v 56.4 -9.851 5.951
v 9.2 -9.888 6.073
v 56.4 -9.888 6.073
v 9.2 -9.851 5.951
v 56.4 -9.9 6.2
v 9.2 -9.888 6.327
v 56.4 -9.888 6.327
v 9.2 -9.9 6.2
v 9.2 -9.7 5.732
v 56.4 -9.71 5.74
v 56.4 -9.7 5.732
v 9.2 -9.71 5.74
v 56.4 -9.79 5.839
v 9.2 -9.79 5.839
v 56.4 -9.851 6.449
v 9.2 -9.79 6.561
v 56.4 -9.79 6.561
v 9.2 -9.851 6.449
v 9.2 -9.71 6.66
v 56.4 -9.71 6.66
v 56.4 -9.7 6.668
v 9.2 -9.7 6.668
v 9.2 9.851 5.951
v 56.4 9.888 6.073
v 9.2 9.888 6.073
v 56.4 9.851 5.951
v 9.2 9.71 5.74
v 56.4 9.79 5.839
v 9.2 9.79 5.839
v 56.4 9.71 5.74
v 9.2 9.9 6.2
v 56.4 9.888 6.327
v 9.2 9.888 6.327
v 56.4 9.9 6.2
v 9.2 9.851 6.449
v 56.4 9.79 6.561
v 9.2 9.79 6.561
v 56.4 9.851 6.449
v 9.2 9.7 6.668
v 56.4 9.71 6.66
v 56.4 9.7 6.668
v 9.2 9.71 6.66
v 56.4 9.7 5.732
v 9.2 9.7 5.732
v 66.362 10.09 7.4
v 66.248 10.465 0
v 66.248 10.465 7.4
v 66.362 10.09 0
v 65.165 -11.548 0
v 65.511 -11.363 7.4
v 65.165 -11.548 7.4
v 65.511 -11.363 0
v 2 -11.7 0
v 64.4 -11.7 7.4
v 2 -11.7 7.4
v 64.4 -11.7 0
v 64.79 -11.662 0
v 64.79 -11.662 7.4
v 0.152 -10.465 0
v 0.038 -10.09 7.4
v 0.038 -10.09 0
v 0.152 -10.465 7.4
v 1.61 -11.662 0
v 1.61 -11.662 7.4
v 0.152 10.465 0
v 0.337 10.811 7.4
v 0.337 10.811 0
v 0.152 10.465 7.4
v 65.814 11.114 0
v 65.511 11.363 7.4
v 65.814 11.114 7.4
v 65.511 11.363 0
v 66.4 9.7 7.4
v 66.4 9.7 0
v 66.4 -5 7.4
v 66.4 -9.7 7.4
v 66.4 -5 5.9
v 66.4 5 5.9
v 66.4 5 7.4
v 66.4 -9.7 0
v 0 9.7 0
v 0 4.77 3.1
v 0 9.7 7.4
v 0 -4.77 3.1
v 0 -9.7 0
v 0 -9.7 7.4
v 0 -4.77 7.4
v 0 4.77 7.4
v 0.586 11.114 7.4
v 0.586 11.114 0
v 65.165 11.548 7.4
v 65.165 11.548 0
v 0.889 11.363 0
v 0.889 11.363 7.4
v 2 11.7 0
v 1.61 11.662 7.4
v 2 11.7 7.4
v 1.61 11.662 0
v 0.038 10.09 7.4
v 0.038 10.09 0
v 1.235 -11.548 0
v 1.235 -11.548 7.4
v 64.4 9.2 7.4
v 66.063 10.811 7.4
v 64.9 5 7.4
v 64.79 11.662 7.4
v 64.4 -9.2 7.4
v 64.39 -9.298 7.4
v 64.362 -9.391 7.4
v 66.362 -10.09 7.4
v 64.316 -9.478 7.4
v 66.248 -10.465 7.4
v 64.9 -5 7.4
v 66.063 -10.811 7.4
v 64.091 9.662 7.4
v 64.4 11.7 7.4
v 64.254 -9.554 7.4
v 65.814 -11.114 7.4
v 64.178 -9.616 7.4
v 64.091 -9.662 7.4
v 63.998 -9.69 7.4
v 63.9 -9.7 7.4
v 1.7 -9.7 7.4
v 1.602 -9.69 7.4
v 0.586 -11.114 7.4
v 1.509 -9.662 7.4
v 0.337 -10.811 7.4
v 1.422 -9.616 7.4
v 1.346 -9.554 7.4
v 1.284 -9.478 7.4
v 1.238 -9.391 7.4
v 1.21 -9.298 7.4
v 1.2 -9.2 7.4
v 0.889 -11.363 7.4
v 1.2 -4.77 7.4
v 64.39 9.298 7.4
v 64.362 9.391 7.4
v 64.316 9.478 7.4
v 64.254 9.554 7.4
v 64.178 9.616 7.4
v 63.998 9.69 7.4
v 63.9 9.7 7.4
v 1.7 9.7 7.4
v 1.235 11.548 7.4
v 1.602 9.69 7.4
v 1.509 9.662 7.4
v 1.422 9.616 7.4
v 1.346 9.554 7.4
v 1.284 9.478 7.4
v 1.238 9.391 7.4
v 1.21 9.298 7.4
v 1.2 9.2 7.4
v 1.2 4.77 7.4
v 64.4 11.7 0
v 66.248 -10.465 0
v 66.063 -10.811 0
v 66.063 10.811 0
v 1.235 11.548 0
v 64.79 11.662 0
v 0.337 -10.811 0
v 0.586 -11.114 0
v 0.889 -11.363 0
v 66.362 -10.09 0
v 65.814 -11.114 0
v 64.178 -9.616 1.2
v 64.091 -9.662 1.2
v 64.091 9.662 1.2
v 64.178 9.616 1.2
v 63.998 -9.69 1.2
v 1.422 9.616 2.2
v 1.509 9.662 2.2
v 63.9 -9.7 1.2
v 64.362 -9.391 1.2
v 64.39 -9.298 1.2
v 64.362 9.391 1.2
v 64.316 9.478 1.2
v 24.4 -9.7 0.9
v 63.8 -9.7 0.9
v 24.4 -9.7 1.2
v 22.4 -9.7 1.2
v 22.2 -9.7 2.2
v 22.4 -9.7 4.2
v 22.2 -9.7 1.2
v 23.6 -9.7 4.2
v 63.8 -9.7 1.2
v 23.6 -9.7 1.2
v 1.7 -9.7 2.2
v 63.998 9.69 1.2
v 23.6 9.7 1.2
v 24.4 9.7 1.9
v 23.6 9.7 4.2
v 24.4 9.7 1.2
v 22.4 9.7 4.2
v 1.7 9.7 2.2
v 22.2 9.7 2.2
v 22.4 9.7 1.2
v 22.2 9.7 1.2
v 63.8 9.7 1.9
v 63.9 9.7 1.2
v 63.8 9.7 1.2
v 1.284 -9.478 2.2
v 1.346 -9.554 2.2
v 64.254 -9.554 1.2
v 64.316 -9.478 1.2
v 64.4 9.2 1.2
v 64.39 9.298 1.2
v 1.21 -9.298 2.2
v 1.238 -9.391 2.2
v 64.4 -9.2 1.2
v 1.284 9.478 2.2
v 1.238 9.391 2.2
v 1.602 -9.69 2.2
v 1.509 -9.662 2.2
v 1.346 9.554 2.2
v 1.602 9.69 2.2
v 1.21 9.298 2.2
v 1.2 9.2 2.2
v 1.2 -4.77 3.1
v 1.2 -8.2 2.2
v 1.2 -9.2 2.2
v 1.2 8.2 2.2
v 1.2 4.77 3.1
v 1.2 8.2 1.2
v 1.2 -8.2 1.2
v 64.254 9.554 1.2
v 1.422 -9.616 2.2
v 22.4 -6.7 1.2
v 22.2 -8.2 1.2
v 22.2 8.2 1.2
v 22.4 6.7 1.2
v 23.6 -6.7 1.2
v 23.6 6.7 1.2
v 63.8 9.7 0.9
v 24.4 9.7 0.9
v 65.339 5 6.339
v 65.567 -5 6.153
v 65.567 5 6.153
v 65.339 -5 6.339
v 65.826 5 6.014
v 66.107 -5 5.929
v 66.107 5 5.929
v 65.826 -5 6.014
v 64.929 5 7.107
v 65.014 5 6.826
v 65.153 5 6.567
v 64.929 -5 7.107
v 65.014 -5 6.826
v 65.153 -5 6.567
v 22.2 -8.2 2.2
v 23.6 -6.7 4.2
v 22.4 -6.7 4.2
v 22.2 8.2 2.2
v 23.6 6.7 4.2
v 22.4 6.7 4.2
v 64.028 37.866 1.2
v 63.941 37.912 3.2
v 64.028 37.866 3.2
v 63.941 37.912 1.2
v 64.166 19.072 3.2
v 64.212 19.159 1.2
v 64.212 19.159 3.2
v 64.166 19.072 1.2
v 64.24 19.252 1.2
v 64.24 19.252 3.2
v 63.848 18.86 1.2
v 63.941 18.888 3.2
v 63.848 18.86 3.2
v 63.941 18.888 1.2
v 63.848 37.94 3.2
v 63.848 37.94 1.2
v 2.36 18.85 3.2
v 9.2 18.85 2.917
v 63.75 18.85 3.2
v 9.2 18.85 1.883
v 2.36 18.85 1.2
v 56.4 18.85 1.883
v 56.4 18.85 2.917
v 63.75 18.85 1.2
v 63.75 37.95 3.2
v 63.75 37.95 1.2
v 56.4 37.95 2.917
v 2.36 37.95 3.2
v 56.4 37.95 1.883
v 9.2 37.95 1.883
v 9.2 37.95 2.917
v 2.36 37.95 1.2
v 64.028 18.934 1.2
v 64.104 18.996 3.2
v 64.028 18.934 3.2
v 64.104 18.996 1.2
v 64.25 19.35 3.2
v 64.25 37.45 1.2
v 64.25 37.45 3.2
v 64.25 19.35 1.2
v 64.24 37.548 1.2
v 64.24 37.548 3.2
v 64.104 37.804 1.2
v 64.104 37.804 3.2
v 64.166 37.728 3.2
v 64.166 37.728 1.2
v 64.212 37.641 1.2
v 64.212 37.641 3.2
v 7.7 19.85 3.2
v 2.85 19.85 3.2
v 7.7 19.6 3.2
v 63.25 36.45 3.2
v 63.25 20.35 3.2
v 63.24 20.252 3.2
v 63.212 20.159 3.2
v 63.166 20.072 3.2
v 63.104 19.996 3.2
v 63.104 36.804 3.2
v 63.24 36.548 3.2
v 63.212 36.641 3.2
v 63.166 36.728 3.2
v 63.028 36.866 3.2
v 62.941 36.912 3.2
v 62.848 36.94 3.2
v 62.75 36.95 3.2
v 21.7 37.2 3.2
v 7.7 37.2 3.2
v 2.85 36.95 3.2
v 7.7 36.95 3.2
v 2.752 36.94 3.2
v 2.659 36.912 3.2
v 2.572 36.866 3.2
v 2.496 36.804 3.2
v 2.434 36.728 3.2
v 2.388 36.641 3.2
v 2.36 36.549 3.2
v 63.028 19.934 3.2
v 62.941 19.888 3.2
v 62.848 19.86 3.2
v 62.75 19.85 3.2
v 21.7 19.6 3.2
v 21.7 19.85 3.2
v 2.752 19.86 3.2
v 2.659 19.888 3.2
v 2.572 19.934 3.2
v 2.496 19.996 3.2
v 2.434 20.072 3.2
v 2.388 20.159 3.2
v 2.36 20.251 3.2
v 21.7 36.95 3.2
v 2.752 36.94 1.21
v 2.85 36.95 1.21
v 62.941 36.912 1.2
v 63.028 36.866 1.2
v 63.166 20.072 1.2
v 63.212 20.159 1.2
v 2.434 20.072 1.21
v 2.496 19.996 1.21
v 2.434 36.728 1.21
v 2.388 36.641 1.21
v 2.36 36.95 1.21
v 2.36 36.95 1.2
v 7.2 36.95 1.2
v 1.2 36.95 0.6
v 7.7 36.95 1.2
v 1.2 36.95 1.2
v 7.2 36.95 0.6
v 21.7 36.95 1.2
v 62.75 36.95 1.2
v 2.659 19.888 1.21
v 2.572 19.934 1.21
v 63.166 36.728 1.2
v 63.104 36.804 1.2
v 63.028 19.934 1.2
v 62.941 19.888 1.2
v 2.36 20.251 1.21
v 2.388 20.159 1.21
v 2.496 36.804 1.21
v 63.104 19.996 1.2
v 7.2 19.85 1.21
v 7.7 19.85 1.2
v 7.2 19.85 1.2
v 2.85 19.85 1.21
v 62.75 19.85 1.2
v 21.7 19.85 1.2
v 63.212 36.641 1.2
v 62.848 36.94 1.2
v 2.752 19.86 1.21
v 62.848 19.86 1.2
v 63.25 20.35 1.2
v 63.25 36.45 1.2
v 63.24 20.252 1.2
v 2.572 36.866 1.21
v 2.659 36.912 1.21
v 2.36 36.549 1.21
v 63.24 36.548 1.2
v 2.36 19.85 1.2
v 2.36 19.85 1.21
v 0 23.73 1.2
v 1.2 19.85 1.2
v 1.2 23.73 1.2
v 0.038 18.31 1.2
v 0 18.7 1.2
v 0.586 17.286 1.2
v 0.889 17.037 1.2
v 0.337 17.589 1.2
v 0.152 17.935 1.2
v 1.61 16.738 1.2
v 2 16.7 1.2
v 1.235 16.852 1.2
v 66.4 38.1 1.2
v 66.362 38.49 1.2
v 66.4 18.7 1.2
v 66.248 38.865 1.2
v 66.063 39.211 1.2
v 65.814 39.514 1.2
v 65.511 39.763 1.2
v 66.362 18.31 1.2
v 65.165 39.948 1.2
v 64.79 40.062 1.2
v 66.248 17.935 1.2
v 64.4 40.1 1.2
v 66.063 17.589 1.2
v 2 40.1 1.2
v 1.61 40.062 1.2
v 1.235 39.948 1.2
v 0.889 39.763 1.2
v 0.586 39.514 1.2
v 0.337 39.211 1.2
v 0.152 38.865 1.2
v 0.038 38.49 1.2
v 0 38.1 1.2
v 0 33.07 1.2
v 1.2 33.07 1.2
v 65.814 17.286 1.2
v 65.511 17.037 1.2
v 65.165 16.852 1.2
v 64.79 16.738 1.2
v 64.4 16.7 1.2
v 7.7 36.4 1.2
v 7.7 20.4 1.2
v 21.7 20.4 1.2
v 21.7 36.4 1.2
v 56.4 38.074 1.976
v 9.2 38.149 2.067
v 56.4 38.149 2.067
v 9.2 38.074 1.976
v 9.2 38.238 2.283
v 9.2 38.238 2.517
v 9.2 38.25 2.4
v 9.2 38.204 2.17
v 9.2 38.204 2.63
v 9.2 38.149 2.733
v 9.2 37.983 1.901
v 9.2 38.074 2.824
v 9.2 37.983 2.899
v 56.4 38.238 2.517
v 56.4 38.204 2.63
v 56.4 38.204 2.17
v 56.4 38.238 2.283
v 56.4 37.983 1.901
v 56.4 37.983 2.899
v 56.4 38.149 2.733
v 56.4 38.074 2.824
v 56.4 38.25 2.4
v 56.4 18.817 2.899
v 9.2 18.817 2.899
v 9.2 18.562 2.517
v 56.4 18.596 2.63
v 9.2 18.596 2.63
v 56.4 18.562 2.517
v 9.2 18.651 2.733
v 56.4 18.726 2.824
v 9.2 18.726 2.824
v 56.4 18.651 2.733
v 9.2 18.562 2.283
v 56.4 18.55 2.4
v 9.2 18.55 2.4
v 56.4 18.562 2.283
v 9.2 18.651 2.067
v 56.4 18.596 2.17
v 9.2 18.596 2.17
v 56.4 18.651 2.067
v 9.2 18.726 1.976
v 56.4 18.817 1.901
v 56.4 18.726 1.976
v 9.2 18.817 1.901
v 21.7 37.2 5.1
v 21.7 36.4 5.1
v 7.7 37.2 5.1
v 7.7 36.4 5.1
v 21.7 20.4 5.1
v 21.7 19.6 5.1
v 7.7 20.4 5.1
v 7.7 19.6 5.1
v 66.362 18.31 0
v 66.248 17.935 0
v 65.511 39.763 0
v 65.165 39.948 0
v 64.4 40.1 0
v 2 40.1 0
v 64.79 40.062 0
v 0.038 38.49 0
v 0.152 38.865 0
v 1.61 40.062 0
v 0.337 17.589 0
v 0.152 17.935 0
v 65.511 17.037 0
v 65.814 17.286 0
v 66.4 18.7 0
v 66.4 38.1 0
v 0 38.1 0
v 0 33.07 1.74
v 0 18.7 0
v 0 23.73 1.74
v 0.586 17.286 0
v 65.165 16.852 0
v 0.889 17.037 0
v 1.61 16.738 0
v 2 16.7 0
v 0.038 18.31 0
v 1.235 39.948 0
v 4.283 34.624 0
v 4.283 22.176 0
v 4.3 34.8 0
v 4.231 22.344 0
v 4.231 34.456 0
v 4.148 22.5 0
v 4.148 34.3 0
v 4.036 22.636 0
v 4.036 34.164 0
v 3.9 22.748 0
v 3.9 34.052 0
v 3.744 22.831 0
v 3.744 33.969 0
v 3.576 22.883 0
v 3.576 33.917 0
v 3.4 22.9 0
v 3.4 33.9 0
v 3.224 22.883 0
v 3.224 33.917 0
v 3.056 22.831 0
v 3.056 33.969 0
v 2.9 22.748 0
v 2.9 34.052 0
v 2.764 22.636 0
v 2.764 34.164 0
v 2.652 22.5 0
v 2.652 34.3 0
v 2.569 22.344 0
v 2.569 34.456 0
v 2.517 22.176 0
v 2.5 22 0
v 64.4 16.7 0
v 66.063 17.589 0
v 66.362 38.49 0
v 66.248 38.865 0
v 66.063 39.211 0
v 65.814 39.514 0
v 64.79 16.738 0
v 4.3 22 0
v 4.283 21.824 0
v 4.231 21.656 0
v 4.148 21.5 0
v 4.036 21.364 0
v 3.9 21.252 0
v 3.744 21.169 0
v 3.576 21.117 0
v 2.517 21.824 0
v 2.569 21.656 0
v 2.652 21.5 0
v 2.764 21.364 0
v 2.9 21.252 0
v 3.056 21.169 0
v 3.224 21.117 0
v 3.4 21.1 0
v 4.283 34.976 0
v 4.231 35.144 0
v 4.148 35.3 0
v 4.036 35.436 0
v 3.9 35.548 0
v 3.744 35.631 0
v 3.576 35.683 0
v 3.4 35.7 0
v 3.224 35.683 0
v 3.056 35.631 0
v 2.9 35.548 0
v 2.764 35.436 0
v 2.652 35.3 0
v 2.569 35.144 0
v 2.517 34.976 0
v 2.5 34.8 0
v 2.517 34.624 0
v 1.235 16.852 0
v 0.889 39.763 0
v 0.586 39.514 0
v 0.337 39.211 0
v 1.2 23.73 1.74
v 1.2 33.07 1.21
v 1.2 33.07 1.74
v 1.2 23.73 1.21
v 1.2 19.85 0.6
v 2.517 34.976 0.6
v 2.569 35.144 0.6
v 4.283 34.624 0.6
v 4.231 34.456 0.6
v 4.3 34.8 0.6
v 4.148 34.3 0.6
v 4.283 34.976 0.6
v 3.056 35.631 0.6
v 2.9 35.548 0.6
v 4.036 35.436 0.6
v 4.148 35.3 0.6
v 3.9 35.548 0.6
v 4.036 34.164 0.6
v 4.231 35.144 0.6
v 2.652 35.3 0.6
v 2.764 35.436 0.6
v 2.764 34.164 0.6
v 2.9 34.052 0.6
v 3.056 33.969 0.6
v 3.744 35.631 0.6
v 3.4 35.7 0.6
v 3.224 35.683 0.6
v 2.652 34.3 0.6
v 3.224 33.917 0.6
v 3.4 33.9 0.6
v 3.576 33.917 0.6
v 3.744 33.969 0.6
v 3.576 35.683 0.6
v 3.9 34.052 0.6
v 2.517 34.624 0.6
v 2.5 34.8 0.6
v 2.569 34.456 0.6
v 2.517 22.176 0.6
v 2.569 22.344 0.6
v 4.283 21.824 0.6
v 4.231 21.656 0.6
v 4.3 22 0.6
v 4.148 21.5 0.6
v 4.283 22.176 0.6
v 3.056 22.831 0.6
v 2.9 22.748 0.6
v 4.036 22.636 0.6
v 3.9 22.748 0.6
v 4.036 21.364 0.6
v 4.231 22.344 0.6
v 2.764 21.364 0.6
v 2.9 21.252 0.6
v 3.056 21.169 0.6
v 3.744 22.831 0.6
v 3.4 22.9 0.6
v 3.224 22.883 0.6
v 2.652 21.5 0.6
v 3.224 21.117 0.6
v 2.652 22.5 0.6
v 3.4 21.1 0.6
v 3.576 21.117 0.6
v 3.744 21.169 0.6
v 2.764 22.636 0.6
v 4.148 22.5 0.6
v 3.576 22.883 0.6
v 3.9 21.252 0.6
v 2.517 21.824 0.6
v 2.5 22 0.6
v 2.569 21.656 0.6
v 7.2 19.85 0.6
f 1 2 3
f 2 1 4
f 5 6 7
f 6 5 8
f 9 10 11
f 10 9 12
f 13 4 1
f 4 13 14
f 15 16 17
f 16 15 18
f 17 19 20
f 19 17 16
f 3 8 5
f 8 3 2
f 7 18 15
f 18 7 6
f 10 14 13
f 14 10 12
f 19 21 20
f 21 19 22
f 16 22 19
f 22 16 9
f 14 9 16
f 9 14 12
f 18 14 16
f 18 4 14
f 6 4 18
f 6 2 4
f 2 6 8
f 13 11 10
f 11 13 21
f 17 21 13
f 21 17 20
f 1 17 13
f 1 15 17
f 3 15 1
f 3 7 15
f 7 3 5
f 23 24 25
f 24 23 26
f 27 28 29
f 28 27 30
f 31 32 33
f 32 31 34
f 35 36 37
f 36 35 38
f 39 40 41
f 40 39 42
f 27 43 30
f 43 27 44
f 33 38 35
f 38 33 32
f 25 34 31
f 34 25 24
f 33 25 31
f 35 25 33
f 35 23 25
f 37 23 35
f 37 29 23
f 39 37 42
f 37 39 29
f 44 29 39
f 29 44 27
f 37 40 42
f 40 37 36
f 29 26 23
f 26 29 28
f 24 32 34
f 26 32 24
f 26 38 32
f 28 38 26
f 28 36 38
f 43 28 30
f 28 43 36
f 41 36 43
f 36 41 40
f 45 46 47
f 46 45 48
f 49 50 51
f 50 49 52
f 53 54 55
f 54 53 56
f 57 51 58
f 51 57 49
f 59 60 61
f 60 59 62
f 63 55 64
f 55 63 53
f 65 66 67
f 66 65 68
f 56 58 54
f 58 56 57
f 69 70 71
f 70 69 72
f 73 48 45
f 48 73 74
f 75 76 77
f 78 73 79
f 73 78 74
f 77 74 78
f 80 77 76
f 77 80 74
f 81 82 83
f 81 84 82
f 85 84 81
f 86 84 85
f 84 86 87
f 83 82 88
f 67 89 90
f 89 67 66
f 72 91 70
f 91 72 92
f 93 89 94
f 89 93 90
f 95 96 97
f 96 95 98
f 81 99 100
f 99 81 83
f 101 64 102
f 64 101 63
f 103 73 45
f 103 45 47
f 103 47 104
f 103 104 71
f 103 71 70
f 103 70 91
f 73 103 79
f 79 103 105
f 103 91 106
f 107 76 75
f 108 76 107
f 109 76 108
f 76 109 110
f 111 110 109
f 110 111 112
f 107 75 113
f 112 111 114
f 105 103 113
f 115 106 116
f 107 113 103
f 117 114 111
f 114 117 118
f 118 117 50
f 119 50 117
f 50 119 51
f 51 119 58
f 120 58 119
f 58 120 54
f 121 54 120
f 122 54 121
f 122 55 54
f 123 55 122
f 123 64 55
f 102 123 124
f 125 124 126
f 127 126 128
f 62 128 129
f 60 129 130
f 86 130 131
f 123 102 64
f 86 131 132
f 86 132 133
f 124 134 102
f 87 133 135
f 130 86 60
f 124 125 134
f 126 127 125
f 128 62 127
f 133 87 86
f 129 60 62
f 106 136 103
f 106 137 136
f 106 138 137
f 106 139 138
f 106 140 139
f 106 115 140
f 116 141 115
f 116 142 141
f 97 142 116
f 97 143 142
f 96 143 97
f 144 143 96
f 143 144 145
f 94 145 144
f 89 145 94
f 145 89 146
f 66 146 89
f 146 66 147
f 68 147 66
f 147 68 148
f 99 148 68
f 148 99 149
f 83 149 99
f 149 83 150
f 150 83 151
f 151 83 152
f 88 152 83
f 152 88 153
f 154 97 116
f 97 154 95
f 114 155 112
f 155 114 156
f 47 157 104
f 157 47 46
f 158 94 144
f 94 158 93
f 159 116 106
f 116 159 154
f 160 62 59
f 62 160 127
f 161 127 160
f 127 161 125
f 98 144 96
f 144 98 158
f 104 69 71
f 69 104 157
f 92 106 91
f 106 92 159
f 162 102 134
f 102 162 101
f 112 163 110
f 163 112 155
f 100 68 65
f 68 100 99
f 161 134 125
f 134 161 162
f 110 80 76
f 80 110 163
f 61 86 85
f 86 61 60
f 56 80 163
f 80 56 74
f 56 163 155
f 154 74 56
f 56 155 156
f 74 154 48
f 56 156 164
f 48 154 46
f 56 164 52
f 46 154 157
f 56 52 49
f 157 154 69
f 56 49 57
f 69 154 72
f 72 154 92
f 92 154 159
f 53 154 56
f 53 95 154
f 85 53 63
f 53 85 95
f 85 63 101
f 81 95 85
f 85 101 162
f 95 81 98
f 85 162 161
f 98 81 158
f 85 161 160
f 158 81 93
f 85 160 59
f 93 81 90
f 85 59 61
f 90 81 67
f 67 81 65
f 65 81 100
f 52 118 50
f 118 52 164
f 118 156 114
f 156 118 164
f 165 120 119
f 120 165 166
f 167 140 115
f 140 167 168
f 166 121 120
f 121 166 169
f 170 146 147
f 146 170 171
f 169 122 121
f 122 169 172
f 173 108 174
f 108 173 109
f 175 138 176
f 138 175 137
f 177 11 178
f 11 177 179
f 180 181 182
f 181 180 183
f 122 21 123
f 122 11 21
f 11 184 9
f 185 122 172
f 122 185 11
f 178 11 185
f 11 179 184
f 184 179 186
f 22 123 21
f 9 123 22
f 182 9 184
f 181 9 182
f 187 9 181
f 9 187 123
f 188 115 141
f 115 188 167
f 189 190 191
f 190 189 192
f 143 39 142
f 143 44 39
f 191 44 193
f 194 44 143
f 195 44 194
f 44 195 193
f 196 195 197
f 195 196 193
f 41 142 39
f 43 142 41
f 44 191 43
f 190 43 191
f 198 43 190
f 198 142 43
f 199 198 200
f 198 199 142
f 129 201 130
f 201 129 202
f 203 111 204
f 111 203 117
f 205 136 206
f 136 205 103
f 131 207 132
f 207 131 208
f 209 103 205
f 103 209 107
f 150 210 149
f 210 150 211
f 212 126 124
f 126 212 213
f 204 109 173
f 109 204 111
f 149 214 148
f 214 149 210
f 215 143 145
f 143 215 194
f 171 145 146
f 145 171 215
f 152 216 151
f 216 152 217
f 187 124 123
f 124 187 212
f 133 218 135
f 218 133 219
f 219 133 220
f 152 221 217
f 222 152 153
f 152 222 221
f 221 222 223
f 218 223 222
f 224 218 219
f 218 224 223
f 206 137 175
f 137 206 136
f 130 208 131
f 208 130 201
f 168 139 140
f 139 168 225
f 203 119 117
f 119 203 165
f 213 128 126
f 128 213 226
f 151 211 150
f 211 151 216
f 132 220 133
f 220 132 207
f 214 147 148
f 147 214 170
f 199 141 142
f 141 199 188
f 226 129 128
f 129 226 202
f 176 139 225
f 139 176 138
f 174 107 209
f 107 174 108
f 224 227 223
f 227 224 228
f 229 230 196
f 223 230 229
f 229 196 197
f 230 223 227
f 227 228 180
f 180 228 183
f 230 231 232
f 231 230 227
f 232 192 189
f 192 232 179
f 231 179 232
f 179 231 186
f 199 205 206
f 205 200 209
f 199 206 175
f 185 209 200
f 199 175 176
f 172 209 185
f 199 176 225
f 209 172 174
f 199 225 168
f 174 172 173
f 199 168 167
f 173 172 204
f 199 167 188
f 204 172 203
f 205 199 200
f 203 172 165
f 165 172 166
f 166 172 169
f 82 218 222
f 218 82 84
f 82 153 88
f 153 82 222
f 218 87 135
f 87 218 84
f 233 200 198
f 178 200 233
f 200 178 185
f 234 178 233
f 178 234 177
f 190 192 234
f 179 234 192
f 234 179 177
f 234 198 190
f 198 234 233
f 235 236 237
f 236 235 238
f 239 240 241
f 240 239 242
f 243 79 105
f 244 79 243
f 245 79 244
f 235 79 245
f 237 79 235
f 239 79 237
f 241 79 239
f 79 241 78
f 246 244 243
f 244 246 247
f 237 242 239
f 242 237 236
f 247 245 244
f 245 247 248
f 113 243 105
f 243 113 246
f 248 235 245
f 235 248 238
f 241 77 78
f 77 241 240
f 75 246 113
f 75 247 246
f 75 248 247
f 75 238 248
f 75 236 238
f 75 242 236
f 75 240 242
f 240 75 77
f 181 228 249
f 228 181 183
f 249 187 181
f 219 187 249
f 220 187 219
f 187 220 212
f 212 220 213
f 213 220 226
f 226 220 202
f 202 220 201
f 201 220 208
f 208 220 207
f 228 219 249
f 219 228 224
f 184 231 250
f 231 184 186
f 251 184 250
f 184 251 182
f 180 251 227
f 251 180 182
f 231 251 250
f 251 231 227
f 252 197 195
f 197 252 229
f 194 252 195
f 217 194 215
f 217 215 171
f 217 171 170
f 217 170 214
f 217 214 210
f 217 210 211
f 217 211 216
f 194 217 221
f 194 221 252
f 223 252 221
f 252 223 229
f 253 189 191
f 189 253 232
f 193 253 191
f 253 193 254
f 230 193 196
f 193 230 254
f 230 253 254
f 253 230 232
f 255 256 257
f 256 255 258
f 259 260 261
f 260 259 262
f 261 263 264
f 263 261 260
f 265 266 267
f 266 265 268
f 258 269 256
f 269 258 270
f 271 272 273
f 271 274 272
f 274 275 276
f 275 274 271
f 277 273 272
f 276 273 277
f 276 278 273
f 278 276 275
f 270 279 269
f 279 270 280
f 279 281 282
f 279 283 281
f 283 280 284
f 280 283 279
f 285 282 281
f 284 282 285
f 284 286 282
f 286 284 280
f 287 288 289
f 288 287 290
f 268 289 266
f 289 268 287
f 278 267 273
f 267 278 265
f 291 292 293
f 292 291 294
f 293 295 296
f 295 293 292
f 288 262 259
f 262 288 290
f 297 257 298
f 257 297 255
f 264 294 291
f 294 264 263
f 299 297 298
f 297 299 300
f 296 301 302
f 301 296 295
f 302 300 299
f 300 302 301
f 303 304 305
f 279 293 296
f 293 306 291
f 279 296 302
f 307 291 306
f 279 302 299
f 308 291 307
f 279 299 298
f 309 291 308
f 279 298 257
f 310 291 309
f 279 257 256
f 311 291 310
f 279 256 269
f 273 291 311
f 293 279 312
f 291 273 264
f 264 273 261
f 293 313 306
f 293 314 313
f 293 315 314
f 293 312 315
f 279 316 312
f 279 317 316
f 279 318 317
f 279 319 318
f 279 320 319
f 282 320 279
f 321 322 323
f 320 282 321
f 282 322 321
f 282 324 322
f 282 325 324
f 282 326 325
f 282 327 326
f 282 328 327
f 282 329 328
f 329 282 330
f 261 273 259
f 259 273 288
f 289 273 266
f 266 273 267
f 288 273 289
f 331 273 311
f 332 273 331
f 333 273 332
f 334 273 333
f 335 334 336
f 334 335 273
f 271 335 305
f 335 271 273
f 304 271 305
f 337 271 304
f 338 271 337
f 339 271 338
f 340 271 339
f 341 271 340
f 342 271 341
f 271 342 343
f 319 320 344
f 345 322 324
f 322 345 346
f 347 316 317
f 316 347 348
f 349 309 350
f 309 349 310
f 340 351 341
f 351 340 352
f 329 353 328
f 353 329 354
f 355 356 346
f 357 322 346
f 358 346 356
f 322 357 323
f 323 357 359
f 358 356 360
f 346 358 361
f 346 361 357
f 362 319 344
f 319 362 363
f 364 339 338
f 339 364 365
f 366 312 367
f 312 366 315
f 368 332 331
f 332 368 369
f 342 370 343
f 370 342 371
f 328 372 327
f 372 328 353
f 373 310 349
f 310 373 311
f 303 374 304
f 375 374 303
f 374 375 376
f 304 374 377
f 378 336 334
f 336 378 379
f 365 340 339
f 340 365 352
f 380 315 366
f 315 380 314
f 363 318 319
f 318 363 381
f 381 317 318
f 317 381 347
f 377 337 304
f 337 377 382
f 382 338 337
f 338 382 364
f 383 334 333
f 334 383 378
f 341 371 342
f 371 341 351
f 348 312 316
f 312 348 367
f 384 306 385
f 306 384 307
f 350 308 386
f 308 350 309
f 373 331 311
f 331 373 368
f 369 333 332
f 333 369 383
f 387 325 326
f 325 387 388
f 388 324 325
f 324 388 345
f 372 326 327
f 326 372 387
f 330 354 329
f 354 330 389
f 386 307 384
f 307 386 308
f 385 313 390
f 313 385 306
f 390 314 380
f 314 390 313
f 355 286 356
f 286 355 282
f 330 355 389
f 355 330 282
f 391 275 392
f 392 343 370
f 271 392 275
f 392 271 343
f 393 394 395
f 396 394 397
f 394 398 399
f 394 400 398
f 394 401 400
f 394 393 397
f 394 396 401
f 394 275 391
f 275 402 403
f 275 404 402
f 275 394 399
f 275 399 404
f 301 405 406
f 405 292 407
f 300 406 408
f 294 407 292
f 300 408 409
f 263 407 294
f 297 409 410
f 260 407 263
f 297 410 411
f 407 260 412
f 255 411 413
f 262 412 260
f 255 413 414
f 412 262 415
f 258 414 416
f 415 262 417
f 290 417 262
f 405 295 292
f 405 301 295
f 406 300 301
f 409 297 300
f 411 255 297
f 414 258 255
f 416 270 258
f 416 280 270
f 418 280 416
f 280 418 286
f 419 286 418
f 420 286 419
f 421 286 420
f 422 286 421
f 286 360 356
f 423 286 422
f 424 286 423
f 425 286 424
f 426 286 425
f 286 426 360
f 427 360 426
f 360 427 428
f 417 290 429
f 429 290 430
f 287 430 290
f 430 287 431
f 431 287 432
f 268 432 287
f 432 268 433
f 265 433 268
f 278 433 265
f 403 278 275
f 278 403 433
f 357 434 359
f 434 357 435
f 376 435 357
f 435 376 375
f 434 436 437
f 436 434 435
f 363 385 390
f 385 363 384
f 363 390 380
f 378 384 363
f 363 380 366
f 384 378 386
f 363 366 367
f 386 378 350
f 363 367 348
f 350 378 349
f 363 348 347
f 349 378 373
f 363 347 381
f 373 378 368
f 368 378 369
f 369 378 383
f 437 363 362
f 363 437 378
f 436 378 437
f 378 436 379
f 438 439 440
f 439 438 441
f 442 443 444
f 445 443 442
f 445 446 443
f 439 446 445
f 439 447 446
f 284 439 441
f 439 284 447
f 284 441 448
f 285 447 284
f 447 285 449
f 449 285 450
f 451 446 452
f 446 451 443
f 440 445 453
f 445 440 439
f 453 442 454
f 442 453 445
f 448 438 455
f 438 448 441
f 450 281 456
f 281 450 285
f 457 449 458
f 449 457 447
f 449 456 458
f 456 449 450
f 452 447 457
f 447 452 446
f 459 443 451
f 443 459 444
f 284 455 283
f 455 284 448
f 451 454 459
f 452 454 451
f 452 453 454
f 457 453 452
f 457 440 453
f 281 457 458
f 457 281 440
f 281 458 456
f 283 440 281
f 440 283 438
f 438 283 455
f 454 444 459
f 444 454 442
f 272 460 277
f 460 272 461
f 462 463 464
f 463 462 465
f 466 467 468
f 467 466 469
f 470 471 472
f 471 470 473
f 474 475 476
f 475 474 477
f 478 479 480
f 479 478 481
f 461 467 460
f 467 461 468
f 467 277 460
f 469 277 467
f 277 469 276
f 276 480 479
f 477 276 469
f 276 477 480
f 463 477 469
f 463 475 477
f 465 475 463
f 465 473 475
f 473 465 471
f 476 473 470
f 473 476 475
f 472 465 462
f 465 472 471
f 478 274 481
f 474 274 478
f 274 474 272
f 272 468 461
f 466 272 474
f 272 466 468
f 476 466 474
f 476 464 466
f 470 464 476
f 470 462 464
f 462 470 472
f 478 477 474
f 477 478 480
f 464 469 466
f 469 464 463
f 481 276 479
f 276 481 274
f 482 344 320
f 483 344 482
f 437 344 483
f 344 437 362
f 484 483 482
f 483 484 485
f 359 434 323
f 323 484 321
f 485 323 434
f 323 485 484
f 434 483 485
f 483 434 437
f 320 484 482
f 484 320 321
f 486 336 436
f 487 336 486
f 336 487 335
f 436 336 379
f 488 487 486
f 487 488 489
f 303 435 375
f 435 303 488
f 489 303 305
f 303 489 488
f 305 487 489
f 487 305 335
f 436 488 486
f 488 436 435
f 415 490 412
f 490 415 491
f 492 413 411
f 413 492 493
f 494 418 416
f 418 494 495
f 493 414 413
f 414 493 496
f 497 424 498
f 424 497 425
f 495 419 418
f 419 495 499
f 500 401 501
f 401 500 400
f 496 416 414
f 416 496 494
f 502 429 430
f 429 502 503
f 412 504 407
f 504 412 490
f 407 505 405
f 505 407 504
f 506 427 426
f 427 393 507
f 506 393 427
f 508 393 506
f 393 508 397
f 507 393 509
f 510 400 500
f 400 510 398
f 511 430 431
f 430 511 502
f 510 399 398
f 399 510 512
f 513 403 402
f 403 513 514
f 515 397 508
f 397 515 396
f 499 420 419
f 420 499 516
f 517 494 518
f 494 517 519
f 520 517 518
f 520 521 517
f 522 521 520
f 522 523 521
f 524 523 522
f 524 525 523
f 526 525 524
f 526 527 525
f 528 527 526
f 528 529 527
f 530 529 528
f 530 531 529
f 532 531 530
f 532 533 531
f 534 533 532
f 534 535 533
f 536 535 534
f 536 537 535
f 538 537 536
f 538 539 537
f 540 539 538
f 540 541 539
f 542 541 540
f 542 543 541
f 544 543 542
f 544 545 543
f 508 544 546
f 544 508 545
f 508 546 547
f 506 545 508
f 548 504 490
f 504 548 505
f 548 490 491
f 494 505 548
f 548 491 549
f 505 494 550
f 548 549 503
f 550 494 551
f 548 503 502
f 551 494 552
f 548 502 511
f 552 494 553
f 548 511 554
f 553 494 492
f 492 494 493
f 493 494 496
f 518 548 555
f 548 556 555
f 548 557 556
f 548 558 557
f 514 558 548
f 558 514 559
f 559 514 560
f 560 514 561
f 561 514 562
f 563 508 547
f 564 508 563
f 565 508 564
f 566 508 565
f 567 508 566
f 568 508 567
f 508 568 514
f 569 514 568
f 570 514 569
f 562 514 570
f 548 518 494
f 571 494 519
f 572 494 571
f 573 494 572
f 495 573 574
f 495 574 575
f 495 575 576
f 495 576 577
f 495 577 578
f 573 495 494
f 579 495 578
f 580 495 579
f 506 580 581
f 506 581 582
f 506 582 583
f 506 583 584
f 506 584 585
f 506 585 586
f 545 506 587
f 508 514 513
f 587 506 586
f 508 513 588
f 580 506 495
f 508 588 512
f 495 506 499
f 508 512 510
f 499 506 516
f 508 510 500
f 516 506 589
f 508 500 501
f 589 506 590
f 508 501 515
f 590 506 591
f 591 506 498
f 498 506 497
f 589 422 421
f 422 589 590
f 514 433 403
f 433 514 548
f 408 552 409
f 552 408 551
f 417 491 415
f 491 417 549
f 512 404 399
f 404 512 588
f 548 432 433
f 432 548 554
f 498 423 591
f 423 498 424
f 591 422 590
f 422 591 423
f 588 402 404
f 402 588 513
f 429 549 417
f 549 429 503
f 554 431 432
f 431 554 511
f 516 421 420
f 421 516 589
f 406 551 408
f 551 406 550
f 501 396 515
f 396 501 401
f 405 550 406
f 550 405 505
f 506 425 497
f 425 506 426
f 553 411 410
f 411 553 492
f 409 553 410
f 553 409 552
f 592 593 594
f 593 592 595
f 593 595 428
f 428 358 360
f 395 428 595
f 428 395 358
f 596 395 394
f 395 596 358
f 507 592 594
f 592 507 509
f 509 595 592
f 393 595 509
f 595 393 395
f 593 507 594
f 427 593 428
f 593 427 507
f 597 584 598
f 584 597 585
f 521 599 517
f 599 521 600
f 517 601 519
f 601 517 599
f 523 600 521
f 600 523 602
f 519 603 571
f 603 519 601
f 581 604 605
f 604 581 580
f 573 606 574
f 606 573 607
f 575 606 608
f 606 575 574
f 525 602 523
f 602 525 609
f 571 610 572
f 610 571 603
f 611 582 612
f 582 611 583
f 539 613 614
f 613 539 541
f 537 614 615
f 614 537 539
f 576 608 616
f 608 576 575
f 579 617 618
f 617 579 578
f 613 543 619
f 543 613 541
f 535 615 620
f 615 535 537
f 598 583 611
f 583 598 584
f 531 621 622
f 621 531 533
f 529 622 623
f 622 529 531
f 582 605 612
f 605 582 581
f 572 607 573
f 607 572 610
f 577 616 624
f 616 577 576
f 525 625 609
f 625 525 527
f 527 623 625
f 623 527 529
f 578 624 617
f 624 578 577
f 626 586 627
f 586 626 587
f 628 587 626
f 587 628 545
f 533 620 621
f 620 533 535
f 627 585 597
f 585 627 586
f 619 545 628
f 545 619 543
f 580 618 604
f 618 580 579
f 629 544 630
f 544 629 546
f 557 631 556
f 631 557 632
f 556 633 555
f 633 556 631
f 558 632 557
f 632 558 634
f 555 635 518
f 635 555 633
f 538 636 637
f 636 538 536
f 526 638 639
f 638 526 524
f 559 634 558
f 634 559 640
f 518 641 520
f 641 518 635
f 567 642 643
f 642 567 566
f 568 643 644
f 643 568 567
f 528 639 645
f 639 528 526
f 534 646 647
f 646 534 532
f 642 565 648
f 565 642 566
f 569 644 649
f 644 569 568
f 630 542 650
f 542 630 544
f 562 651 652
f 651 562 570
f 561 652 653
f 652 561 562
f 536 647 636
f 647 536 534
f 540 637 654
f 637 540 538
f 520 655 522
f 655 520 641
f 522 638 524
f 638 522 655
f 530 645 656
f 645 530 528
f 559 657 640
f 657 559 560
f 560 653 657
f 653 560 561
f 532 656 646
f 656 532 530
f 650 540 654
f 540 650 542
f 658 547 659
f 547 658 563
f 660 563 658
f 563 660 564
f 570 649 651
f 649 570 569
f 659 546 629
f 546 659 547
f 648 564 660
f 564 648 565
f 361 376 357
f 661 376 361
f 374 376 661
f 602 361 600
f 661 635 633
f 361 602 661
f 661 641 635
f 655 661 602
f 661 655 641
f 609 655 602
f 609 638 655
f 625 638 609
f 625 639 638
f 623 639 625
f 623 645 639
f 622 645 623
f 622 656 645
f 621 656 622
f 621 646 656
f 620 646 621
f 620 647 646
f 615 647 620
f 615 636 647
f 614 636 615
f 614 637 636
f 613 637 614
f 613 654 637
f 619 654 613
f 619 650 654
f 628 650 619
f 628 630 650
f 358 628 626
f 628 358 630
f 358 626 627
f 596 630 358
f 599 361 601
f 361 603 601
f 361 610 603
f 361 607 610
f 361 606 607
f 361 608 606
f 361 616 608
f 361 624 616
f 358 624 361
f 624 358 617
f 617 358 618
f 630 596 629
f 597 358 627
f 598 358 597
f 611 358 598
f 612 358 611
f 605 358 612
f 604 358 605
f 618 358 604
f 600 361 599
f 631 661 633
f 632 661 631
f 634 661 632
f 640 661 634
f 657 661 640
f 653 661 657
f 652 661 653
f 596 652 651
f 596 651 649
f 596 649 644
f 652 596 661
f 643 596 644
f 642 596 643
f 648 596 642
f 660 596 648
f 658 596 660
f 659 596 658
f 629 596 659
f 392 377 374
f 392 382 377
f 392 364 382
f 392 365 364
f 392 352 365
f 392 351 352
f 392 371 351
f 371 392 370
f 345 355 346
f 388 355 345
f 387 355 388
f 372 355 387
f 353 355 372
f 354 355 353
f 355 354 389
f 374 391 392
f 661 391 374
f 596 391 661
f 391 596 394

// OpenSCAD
// SPDX-License-Identifier: AGPL-3.0-or-later
// Case for the Seeed Studio XIAO ESP32S3 (non-Sense) used as the AppleRemoteEsp32 USB dongle.
// Tray + lid, two styles: "snap" (press fit, snap bead) or "slide" (server-chassis style: the lid drops in with its
// lugs in L slots of the walls, then slides towards the USB end over a detent). The FPC antenna is glued on the tray floor beyond the board (not under its ground plane),
// the U.FL cable is coiled above it. No pin headers: the lid ribs press on the castellated edges.
// Print: part = "both" lays the lid upside down next to the tray. PLA/PETG, 0.2 mm layers, no supports.
// Measure your board with calipers and adjust the parameters before printing.

part = "both"; // ["tray", "lid", "both"]
style = "snap"; // ["snap", "slide"]

/* [Board: measure yours] */
pcb_l = 21;          // along the USB axis
pcb_w = 17.8;
pcb_t = 1.2;
usb_w = 8.94;        // USB-C receptacle
usb_h = 3.26;
usb_overhang = 1.2;  // receptacle overhang past the PCB edge = thickness of the USB end wall
headroom = 4;        // free height above the PCB (shield, U.FL plug + cable)
// BOOT and RESET: [distance from the USB edge of the PCB, offset from the centre line]
buttons = [[2.2, -6.4], [2.2, 6.4]];
btn_d = 1.8;

/* [Antenna (FPC shipped with the board)] */
antenna = true;      // false: board only, no room for the antenna
sma = false;         // RP-SMA bulkhead in the rear wall (U.FL to RP-SMA pigtail), for an external antenna
sma_d = 6.5;         // hole for the 1/4"-36 thread
sma_z = 5;           // hole centre height: the ~8 mm nut (9.2 mm across corners) must clear the bottom
sma_room = 12;       // extra length behind the board for the connector body and cable
ant_l = 39;
ant_w = 19;

/* [Case] */
wall = 2;
floor_t = 1.2;
top_t = 1.2;
under = 1;      // gap under the PCB
fit = 0.2;      // clearance around the PCB
clr = 0.15;     // lid lip clearance
snap = 0.3;     // "snap": bead on the lip's long sides, clicks into a groove in the tray walls (0 = friction fit only)
slide = 5;      // "slide": travel of the lid, > lug_l
lug_l = 3;      // "slide": lugs on the lip's long sides
lug_d = 0.8;    // depth into the wall, < wall - 0.8
lug_h = 1.2;
r = 2;          // outer corner radius
window_l = 6;   // thinned lid strip over the LEDs, from the USB end (print the lid in a light colour)
window_t = 0.6;

$fn = 32;

in_l = pcb_l + fit + (antenna ? 2 + ant_l + 1 : 1.2 + 2) + (sma ? sma_room : 0);  // without antenna: rear stops + U.FL plug
in_w = (antenna ? max(pcb_w, ant_w) : pcb_w) + 2 * fit;
in_h = max(under + pcb_t + headroom, sma ? sma_z + sma_d / 2 + 0.8 - floor_t : 0);  // SMA hole stays in the tray
out_l = usb_overhang + in_l + wall;
out_w = in_w + 2 * wall;
tray_h = floor_t + in_h;
usb_z = floor_t + under + pcb_t;  // PCB top = receptacle bottom
x0 = usb_overhang;                // inner face of the USB end wall = PCB edge
notch_w = usb_w + 0.6;            // also centres the board sideways
ant_x = x0 + pcb_l + fit + 2;
snap_z = tray_h - 1.2;
slider = style == "slide";
lip_h = slider ? 3 : 2;                          // deeper on "slide": wall material above the lug channel
lip_l = in_l - 2 * clr - (slider ? slide : 0);   // shorter at the rear: room to drop the lid in before sliding
lug_z = tray_h - 2.2;
lug_e = antenna ? 8 : 2;                          // lug inset from the lip ends
lug_xs = [x0 + lug_e, x0 + lip_l - lug_e - lug_l]; // final positions (lid closed)

module snap_bead(rad) {           // horizontal half-round along both long sides
    e = antenna ? 8 : 3;
    for (s = [-1, 1]) translate([x0 + e, s * (in_w / 2 - clr - 0.6 + snap), snap_z])
        rotate([0, 90, 0]) cylinder(r = rad, h = in_l - 2 * e);
}

module rbox(l, w, h, rad = r) {   // rounded box, x from 0, y centred
    translate([0, -w / 2, 0]) linear_extrude(h) offset(rad) offset(-rad) square([l, w]);
}

module tray() {
    difference() {
        rbox(out_l, out_w, tray_h);
        translate([x0, 0, floor_t]) rbox(in_l, in_w, in_h + 1, 0.5);
        // USB notch, open to the top: the lid tab closes it
        translate([-1, -notch_w / 2, usb_z - 0.3]) cube([x0 + 2, notch_w, tray_h]);
        // antenna locating pocket
        if (antenna) translate([ant_x, -ant_w / 2 - 0.2, floor_t - 0.3]) cube([ant_l + 0.4, ant_w + 0.4, 1]);
        if (!slider && snap > 0) snap_bead(0.65);
        // nail notch under the lid edge: rear, or middle of a long side when the SMA nut takes the rear
        if (sma) translate([out_l / 2 - 5, out_w / 2, tray_h]) rotate([0, 90, 0]) cylinder(r = 1.5, h = 10);
        else translate([out_l, -5, tray_h]) rotate([-90, 0, 0]) cylinder(r = 1.5, h = 10);
        if (sma) translate([out_l - wall - 1, 0, sma_z]) rotate([0, 90, 0]) cylinder(d = sma_d, h = wall + 2);
        // L slots: drop in at +slide, slide to the closed position
        if (slider) for (m = [0, 1], x = lug_xs) mirror([0, m, 0]) {
            translate([x - clr, in_w / 2 - 0.5, lug_z - lug_h / 2 - clr]) cube([lug_l + slide + 2 * clr, lug_d + 0.5, lug_h + 2 * clr]);
            translate([x + slide - clr, in_w / 2 - 0.5, lug_z - lug_h / 2 - clr]) cube([lug_l + 2 * clr, lug_d + 0.5, tray_h]);
        }
    }
    // detents just behind the closed lugs (0.2 mm interference, the lip flexes)
    if (slider) for (m = [0, 1], x = lug_xs) mirror([0, m, 0])
        translate([x + lug_l + clr + 0.35, in_w / 2 + lug_d, lug_z - lug_h / 2 - clr]) cylinder(r = 0.35, h = lug_h + 2 * clr);
    for (s = [-1, 1]) {
        // rails under the long PCB edges
        translate([x0, s * (in_w / 2 - 0.75) - 0.75, floor_t]) cube([pcb_l, 1.5, under]);
        // rear stops at the edges, the U.FL cable passes in the middle
        translate([x0 + pcb_l + fit, s * (in_w / 2 - 1.5) - 1.5, floor_t]) cube([1.2, 3, under + pcb_t + 0.8]);
    }
}

// Modelled in its assembled position (plate on top of the tray, features hanging down).
module lid() {
    difference() {
        union() {
            translate([0, 0, tray_h]) rbox(out_l, out_w, top_t);
            // lip, without its USB end segment (the receptacle sits there)
            difference() {
                translate([x0 + clr, 0, tray_h - lip_h]) difference() {
                    rbox(lip_l, in_w - 2 * clr, lip_h + 0.01, 0.5);
                    translate([1, 0, -1]) rbox(lip_l - 2, in_w - 2 * clr - 2, lip_h + 2, 0.5);
                }
                translate([0, -out_w / 2, 0]) cube([x0 + clr + 1.01, out_w, tray_h]);
                // and without its rear segment when the SMA connector body sits there
                if (sma) translate([x0 + clr + lip_l - 1.01, -out_w / 2, 0]) cube([10, out_w, tray_h]);
            }
            if (!slider && snap > 0) snap_bead(0.6);
            if (slider) for (m = [0, 1], x = lug_xs) mirror([0, m, 0])
                translate([x, in_w / 2 - clr - 0.01, lug_z - lug_h / 2]) cube([lug_l, lug_d + 0.01, lug_h]);
            // tab closing the USB notch above the receptacle
            translate([0, -notch_w / 2 + 0.1, usb_z + usb_h + 0.2]) cube([x0, notch_w - 0.2, tray_h - usb_z - usb_h]);
            // ribs pressing the PCB edges down (shorter on "slide": they must clear the rear stops when dropped in)
            for (s = [-1, 1])
                translate([x0 + window_l + 0.5, s * (pcb_w / 2 - 0.5) - 0.4, usb_z + 0.1])
                    cube([pcb_l - window_l - 1 - (slider ? slide : 0), 0.8, tray_h - usb_z]);
        }
        translate([x0, -(in_w / 2 - clr - 1), tray_h - 0.01]) cube([window_l, in_w - 2 * clr - 2, top_t - window_t + 0.01]);
        for (b = buttons) translate([x0 + b[0], b[1], tray_h - 1]) cylinder(d = btn_d, h = top_t + 2);
        // "slide": thumb grip grooves at the rear (grooves, not ridges: the lid prints top down)
        if (slider) for (i = [1:4]) translate([out_l - 2 - 2 * i, -6, tray_h + top_t - 0.4]) cube([0.8, 12, 1]);
    }
}

if (part == "tray" || part == "both") tray();
if (part == "lid") translate([0, 0, tray_h + top_t]) rotate([180, 0, 0]) lid();
if (part == "both") translate([0, out_w + 5, tray_h + top_t]) rotate([180, 0, 0]) lid();
